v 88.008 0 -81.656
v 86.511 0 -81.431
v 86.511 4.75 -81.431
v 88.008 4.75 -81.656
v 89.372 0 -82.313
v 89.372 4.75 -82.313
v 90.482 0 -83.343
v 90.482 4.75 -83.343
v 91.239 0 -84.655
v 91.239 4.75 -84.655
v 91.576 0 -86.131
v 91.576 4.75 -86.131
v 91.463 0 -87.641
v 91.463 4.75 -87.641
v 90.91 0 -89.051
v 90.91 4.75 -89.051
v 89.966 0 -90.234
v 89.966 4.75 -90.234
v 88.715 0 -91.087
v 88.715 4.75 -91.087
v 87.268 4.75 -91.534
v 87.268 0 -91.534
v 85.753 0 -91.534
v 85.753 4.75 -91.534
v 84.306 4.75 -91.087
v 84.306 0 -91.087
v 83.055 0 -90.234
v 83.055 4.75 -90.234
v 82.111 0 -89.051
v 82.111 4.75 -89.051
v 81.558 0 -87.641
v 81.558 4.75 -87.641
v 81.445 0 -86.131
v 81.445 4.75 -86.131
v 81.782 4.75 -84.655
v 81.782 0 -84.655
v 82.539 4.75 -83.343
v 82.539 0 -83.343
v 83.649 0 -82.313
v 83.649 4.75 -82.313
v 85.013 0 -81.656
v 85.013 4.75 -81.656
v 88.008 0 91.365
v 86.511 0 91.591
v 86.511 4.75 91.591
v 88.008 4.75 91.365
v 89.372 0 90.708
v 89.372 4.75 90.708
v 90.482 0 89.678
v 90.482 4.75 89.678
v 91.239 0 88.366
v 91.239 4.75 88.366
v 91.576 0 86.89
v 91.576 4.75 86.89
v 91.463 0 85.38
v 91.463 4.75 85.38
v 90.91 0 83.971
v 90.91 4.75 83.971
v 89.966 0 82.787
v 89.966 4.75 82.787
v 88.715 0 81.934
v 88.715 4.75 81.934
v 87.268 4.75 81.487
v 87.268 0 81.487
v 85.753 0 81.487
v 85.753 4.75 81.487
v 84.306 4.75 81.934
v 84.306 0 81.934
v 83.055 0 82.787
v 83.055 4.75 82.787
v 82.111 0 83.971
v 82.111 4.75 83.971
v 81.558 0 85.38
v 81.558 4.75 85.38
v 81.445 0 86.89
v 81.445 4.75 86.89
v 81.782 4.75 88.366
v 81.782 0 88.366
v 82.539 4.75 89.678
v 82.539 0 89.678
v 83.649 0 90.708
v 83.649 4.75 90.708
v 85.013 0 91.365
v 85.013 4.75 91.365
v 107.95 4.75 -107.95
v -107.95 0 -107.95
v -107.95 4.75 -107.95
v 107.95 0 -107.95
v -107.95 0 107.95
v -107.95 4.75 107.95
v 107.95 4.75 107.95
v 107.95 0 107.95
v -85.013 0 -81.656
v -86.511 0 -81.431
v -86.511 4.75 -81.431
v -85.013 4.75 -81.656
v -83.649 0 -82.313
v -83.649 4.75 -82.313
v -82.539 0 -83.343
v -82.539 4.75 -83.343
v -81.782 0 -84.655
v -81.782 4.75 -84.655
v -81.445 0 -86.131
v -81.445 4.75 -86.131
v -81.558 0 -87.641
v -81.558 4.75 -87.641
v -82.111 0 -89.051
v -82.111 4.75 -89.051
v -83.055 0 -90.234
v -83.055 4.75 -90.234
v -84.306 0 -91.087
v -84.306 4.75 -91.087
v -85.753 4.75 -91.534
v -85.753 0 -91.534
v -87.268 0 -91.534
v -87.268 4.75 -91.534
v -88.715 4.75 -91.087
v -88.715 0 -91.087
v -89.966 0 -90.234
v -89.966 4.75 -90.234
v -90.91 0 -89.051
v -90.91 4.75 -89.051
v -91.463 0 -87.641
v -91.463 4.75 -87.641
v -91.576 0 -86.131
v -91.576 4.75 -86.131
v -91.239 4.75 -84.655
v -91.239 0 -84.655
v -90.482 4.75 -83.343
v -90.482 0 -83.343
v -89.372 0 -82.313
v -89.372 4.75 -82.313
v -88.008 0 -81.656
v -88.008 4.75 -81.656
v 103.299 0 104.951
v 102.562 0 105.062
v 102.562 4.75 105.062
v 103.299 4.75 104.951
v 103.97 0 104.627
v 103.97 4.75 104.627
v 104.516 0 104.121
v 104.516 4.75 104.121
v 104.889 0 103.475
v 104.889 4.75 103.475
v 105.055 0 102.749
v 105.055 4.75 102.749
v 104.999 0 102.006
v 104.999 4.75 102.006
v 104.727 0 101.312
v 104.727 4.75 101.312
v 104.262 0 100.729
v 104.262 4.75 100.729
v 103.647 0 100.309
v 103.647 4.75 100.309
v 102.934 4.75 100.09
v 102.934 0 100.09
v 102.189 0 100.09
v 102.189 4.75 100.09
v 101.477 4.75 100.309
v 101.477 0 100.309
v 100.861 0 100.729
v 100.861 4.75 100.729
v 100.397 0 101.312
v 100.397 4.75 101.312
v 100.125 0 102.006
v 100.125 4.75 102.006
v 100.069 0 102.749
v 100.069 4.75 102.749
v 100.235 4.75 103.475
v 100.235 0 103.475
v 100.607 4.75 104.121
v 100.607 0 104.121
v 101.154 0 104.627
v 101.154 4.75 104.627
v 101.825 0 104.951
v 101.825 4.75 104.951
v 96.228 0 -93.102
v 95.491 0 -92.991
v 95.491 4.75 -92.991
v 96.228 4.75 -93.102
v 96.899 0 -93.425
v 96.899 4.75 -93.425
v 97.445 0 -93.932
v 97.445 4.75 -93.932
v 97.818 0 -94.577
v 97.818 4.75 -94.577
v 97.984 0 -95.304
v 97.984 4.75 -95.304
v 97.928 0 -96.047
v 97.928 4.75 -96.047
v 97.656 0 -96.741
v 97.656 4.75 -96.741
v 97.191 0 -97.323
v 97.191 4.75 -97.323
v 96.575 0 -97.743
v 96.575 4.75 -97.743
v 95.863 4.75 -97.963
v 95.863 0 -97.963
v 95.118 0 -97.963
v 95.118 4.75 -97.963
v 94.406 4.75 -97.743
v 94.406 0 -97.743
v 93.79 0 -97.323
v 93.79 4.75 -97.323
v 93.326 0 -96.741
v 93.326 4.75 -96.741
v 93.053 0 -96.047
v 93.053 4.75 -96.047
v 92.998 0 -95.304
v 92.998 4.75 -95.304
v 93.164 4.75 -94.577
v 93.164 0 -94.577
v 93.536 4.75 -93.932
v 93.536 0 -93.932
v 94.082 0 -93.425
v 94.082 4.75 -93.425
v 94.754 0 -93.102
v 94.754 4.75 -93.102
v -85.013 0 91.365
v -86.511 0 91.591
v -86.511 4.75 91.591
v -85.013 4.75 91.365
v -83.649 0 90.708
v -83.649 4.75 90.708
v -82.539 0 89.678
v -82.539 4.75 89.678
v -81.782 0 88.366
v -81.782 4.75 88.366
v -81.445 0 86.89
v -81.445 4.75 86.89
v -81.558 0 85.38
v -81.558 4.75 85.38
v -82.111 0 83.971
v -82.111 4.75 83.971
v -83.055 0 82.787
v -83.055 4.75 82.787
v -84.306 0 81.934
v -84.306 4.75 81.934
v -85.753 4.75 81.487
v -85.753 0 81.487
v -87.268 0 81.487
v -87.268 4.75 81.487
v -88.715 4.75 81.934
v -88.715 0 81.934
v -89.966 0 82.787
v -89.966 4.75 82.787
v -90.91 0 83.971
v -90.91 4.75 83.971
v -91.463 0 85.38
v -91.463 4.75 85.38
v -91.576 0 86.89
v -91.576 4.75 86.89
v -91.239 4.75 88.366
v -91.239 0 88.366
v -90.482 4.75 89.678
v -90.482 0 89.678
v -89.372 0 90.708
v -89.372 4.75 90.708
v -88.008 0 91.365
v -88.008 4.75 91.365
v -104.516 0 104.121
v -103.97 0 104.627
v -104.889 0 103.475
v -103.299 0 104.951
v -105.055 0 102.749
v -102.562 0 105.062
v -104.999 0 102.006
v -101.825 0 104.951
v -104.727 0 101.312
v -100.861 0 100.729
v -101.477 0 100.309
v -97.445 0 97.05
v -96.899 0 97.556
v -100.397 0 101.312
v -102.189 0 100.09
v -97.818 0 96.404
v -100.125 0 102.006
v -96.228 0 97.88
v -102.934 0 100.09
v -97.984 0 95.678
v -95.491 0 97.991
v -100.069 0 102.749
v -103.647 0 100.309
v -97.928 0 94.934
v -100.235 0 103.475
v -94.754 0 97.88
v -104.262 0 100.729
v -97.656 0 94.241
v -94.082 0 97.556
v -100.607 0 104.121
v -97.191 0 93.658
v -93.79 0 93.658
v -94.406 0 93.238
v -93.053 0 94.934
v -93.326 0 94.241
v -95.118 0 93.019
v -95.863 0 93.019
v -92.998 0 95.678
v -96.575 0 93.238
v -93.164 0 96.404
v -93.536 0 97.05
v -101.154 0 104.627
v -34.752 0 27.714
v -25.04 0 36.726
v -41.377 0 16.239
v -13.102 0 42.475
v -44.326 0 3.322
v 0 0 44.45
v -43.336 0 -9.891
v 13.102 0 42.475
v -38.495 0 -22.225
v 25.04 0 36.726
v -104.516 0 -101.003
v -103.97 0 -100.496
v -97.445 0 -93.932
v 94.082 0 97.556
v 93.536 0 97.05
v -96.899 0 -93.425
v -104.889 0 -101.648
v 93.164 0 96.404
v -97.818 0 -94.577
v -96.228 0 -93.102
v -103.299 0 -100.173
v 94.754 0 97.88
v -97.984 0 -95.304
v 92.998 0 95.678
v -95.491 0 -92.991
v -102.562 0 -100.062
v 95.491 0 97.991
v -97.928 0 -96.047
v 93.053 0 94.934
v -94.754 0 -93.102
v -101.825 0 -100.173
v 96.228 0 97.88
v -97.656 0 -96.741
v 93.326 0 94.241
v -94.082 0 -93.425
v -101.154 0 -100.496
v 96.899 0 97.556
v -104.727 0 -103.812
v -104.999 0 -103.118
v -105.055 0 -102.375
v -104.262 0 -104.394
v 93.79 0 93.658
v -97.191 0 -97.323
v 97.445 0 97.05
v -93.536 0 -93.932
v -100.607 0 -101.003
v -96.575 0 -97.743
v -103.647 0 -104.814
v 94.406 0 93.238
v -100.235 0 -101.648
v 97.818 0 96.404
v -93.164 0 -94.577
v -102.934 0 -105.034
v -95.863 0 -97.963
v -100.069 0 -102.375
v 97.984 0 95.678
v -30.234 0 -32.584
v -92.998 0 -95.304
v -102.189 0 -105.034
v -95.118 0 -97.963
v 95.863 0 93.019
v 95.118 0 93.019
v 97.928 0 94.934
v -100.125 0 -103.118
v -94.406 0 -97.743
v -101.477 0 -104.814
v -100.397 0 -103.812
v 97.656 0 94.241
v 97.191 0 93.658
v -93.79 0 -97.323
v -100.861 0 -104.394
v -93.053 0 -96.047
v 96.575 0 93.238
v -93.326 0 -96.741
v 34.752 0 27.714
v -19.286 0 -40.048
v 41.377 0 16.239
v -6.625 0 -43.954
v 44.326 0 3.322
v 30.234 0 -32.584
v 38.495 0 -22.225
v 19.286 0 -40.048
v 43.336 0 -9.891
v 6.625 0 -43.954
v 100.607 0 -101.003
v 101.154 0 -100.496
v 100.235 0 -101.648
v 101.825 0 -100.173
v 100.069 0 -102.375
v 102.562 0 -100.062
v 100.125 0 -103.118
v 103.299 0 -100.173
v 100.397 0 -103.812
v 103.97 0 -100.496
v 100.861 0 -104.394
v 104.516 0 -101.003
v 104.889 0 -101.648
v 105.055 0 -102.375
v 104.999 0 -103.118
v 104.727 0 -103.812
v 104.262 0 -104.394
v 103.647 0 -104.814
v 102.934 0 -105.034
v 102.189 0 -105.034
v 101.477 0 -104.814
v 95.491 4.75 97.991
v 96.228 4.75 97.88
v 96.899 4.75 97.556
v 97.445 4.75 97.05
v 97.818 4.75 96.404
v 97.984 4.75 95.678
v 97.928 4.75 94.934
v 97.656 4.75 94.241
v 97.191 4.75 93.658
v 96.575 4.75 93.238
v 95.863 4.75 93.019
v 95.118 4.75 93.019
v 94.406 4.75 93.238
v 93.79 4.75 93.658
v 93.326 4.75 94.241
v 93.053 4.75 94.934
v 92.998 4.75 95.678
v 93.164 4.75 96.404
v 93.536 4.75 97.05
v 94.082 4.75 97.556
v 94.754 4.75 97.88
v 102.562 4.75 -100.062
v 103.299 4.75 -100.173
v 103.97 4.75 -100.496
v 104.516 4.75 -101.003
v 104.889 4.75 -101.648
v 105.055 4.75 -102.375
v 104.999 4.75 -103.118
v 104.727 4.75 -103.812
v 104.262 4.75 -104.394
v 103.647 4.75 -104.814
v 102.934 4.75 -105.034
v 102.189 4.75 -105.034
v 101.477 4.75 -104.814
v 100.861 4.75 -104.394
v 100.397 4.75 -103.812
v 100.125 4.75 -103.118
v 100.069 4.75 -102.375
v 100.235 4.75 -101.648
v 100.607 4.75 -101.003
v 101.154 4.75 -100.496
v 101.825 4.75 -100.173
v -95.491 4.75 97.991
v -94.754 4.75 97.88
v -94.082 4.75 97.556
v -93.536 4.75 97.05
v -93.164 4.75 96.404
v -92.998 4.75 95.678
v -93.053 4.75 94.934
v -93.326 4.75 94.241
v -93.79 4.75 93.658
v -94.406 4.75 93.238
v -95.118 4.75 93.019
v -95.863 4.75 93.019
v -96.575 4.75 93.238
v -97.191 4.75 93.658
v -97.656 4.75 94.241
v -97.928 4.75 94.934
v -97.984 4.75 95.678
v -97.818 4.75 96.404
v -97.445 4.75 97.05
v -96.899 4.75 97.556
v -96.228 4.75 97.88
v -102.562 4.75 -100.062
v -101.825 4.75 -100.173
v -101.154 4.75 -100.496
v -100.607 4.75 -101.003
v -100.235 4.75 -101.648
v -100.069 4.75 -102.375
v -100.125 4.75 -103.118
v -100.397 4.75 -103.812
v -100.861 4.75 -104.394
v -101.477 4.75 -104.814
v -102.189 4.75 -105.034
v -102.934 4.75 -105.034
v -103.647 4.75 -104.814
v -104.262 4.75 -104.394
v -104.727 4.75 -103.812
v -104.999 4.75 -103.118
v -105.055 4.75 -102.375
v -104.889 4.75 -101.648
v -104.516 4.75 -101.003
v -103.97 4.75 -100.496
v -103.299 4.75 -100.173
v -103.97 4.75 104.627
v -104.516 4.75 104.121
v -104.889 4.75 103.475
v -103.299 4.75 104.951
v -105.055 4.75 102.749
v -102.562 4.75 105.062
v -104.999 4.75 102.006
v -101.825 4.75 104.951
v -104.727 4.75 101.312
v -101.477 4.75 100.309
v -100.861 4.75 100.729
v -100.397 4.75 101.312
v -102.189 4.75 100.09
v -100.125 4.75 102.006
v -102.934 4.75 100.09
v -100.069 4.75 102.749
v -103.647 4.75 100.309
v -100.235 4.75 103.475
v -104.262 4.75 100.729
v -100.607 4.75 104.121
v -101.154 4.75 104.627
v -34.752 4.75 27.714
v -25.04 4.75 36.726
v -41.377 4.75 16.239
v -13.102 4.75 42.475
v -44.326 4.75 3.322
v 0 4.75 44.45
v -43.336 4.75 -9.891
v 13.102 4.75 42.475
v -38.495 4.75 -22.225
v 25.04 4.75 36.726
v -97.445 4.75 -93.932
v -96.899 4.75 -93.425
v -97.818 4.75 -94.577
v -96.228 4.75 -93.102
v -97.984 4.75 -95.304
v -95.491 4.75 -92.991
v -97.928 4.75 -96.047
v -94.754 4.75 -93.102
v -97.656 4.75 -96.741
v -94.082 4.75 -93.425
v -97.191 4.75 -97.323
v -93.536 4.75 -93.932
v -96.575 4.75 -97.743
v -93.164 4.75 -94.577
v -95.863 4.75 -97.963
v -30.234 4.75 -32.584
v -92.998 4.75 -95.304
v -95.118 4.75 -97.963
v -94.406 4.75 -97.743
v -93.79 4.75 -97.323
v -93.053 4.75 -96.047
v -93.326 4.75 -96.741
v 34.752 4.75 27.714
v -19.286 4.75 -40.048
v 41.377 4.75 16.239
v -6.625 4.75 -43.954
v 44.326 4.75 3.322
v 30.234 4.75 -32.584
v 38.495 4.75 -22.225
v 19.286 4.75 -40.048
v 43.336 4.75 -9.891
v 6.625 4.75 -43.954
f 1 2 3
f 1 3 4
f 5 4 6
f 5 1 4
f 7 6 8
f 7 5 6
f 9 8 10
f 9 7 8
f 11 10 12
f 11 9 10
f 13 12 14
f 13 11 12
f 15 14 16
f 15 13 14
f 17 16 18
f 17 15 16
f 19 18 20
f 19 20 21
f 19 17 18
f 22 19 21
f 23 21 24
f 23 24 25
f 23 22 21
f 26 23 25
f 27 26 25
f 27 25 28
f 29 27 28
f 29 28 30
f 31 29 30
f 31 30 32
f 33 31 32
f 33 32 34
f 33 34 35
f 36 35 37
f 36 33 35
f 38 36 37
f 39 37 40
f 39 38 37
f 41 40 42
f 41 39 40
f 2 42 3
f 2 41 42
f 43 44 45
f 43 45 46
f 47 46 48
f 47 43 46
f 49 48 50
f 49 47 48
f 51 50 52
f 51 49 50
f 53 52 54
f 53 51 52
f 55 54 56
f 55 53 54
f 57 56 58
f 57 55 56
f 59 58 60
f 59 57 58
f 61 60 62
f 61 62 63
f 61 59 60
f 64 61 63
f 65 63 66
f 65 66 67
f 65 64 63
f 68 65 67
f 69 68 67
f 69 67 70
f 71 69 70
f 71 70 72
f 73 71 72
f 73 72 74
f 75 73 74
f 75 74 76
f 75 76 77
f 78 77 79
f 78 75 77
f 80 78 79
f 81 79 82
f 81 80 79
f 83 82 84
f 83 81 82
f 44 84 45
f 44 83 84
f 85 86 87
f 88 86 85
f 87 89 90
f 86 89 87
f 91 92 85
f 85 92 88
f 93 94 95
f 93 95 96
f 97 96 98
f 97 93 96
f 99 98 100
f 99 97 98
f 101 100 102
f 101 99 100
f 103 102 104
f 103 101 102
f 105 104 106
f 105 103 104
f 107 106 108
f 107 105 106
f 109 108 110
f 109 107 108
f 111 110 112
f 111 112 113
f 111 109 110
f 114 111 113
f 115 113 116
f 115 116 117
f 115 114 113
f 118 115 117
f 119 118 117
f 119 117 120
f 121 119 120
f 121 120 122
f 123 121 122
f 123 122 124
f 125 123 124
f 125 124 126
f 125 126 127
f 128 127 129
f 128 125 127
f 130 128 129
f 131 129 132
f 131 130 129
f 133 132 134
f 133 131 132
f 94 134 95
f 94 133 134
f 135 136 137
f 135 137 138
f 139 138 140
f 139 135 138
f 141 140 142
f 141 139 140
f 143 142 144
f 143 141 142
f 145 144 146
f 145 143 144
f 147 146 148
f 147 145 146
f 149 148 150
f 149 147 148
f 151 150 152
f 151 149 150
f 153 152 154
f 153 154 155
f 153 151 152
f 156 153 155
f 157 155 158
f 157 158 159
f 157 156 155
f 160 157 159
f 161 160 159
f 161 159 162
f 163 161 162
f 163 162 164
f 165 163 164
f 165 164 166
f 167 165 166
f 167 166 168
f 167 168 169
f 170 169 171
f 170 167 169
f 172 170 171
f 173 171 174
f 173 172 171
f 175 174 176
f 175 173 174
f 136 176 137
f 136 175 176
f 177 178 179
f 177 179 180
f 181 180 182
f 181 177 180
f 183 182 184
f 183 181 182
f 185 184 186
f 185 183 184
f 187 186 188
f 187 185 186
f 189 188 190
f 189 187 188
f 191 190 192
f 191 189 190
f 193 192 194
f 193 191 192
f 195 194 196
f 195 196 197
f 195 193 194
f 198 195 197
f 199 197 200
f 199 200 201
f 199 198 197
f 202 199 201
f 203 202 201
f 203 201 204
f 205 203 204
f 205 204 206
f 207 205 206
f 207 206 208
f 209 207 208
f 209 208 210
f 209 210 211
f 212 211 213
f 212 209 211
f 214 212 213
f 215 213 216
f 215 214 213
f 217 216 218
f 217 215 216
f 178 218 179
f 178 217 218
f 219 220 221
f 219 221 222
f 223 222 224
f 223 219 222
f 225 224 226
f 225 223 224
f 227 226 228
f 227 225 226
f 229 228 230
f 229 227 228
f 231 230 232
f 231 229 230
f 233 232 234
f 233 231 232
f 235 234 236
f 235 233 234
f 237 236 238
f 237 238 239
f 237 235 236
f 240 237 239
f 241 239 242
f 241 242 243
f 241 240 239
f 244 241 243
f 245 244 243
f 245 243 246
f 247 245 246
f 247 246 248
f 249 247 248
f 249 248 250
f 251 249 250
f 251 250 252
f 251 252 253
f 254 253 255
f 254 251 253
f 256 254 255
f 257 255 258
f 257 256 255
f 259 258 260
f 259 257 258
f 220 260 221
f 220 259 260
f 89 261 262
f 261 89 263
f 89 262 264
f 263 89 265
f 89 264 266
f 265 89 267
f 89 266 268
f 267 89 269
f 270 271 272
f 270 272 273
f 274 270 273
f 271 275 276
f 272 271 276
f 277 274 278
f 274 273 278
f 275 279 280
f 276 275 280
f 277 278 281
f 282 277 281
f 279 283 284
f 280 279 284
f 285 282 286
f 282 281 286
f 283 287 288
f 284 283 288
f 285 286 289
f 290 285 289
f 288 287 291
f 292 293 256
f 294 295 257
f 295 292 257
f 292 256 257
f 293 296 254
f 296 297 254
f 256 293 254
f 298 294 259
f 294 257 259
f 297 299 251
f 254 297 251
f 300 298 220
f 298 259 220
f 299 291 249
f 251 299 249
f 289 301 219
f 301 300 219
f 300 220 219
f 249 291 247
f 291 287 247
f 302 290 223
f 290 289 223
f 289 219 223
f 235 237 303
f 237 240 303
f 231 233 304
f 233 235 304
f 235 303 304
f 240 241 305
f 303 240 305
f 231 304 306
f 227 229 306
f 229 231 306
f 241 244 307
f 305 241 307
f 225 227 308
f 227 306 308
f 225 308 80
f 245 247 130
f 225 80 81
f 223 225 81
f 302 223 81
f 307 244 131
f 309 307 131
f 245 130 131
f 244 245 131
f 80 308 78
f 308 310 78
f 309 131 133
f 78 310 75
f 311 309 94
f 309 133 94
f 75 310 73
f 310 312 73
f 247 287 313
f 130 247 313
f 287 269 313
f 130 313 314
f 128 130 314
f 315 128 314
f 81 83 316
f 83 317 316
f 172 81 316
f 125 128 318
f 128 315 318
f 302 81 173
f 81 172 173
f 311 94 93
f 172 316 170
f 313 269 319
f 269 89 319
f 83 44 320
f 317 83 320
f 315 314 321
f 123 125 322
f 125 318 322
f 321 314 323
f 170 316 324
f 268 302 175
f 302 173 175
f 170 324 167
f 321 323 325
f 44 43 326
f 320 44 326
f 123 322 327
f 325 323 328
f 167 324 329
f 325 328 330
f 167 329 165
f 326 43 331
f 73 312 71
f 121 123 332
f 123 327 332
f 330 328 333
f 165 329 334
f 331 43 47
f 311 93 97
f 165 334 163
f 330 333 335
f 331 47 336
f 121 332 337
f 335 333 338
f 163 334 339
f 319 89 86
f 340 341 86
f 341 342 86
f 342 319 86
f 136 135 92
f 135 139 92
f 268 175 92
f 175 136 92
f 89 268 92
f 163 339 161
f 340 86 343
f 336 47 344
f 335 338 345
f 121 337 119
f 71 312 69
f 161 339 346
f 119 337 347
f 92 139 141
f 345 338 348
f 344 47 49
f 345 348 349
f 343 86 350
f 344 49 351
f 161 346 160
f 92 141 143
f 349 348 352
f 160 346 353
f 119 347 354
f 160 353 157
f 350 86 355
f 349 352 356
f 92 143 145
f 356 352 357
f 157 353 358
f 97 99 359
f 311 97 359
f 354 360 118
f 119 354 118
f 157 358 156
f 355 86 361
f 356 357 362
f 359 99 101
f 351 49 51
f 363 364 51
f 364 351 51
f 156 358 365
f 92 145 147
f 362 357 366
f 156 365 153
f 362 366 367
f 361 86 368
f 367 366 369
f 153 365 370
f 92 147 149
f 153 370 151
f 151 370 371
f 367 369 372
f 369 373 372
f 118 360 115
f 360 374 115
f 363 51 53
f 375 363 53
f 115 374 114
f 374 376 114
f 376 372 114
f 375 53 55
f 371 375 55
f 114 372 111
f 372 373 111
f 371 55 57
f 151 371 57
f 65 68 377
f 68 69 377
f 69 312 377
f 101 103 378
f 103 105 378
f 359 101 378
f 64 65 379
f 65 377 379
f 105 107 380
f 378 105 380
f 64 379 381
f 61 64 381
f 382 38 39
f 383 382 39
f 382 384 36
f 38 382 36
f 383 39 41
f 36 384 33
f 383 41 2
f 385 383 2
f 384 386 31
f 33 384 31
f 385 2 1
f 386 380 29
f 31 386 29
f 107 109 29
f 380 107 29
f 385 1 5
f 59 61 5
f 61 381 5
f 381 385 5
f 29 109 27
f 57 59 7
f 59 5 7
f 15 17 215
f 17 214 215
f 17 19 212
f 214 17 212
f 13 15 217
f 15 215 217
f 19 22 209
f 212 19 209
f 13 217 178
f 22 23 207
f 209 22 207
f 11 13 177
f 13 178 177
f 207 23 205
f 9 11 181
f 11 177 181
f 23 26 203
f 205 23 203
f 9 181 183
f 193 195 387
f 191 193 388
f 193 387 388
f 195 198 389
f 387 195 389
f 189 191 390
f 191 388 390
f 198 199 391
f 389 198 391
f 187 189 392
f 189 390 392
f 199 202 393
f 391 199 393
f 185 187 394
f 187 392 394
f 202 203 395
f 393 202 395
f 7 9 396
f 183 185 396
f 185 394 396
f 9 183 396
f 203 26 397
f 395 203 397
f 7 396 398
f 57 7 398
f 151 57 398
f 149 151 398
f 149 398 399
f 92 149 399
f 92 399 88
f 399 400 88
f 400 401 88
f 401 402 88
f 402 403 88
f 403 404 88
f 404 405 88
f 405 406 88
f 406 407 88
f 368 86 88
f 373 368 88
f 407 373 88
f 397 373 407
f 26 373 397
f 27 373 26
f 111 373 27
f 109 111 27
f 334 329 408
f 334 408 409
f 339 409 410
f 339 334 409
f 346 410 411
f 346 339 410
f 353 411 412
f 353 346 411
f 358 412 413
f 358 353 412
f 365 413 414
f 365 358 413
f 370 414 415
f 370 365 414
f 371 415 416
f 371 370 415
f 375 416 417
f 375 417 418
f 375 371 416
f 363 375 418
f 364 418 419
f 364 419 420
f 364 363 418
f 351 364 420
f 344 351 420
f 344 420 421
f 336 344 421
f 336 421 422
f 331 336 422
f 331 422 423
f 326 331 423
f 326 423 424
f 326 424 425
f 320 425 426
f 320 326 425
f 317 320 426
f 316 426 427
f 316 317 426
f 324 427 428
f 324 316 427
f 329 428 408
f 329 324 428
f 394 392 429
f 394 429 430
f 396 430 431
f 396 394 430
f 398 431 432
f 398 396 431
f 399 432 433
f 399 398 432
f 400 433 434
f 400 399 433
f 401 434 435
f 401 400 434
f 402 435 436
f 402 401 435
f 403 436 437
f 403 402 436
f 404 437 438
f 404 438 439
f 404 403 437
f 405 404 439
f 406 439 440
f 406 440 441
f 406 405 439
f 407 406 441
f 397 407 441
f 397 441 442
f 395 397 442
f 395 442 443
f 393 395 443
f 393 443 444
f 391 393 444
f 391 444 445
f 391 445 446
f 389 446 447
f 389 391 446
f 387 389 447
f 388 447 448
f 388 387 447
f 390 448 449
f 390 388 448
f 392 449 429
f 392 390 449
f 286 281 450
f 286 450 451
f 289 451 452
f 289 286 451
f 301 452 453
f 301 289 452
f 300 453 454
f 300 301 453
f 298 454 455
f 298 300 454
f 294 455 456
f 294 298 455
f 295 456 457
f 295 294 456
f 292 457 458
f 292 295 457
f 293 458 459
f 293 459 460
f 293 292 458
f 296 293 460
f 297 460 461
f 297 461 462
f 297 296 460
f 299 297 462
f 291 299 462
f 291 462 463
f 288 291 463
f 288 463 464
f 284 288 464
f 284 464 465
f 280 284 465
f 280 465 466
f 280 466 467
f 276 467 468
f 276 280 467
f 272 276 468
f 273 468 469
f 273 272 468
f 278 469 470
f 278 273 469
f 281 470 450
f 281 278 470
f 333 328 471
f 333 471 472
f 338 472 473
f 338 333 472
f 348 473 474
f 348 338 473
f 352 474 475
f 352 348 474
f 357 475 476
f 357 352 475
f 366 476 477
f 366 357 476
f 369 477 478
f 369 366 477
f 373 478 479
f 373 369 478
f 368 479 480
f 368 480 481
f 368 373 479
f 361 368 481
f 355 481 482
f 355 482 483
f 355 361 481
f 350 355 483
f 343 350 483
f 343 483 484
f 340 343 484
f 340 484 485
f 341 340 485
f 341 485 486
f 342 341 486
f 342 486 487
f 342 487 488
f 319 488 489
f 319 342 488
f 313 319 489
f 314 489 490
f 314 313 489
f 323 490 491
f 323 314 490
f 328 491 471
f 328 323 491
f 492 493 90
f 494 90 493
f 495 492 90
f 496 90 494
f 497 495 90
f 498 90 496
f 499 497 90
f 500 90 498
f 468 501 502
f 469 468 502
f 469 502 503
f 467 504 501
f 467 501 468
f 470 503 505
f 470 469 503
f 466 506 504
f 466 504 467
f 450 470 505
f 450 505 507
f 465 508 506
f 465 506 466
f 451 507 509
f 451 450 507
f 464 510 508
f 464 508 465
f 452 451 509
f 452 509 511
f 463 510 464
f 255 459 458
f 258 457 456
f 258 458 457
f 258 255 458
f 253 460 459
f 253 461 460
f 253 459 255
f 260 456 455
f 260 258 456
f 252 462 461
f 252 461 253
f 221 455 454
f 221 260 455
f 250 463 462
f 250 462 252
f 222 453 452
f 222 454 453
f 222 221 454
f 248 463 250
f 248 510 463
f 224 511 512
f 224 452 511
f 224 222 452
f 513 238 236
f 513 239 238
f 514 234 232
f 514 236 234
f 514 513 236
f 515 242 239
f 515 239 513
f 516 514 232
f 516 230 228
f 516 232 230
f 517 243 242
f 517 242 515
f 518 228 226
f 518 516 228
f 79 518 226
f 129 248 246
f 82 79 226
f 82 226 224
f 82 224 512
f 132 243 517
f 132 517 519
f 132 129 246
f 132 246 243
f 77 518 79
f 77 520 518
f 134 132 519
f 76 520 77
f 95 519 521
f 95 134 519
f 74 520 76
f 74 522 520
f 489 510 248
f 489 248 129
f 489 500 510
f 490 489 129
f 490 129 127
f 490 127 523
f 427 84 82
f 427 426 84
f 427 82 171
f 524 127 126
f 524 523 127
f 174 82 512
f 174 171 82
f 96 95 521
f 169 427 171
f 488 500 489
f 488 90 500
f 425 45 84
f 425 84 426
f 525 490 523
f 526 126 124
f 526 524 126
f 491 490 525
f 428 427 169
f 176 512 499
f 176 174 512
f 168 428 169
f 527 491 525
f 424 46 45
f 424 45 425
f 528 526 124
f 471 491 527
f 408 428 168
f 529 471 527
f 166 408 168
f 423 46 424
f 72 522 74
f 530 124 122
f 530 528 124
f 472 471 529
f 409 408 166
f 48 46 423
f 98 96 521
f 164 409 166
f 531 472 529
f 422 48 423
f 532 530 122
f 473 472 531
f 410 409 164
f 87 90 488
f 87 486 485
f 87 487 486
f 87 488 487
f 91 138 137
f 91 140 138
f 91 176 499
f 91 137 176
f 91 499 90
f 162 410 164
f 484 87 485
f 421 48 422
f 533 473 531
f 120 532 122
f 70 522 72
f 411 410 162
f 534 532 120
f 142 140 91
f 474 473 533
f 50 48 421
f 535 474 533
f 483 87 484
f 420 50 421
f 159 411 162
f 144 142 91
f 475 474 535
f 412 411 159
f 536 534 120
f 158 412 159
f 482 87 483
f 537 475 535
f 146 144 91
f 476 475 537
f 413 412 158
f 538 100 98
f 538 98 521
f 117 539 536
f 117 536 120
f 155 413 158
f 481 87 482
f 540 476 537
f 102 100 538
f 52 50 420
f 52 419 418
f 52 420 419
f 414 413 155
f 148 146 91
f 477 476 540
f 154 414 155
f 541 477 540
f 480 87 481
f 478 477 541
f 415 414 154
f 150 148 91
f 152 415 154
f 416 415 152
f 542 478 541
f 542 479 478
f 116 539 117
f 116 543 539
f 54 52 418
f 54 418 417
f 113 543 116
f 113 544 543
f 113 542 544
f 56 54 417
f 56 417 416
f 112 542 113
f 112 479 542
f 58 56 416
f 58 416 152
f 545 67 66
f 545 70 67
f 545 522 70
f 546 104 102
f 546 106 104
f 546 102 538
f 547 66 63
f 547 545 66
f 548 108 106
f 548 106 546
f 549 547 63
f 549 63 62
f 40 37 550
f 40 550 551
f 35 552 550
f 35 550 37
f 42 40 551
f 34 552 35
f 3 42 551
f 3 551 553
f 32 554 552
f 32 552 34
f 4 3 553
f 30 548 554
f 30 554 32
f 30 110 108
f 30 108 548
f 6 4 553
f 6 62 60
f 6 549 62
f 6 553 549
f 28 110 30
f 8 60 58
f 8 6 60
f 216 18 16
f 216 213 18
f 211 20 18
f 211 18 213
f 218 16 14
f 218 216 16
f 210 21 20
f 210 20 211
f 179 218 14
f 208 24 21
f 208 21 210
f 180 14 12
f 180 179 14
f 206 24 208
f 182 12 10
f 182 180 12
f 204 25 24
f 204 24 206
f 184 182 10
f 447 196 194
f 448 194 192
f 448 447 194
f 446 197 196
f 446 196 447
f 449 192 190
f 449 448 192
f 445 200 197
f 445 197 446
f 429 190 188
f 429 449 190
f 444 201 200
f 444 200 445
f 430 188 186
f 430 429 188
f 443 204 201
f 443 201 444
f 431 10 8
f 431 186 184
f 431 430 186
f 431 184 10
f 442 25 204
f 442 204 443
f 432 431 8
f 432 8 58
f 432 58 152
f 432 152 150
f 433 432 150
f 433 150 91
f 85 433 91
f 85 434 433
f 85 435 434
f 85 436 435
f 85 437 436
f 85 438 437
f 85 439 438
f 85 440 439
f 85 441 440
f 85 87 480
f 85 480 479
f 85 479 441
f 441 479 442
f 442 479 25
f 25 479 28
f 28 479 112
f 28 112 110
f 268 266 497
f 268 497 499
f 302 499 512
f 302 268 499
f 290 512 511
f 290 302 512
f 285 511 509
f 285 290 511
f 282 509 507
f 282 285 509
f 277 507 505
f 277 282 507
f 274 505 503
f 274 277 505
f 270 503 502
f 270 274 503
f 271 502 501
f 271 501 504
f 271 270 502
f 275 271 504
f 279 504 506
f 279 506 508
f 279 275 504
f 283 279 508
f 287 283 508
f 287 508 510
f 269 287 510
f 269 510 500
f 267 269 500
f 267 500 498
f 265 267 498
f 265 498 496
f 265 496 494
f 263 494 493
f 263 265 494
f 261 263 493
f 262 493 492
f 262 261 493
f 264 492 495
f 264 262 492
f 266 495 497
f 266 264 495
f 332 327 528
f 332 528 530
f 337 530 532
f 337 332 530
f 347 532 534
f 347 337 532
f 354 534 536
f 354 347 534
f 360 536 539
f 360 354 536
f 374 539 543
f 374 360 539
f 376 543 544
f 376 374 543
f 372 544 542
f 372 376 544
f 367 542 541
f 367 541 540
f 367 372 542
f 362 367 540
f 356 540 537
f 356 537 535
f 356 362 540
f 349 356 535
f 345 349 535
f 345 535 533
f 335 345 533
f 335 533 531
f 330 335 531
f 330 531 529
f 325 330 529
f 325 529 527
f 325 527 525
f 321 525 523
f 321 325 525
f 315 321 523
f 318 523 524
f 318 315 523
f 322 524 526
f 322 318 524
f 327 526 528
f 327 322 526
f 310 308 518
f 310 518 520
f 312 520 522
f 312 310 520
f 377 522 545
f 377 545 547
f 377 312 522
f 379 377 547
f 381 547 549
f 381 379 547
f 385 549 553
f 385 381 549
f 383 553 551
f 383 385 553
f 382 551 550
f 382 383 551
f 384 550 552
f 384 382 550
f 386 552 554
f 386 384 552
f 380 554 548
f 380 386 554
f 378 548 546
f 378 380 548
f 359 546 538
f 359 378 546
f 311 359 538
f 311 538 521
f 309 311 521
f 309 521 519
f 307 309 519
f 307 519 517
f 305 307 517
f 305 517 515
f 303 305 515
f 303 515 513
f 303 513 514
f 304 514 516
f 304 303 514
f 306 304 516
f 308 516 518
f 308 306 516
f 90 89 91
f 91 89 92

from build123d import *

# Parameters (mm, degrees)
SKETCH1_W           = 215.9
SKETCH1_H           = 215.9
SKETCH1_R           = 2.5
SKETCH1_R_2         = 5.08
SKETCH1_R_3         = 44.45
BOSS_EXTRUDE1_DEPTH = 4.7498


with BuildPart() as part:
    # Sketch1 → Boss-Extrude1 (new body)
    with BuildSketch(Plane(origin=(0, 0, 0), x_dir=(1, 0, 0), z_dir=(0, 1, 0))):
        Rectangle(SKETCH1_W, SKETCH1_H)
        with Locations(Location((95.490778515, -95.490778515, 0), (0, 0, 270))):
            Circle(SKETCH1_R, mode=Mode.SUBTRACT)
        with Locations(Location((102.561846327, -102.561846327, 0), (0, 0, 270))):
            Circle(SKETCH1_R, mode=Mode.SUBTRACT)
        with Locations(Location((-95.490778515, -95.490778515, 0), (0, 0, 270))):
            Circle(SKETCH1_R, mode=Mode.SUBTRACT)
        with Locations(Location((-102.561846327, -102.561846327, 0), (0, 0, 270))):
            Circle(SKETCH1_R, mode=Mode.SUBTRACT)
        with Locations(Location((-95.490778515, 95.490778515, 0), (0, 0, 270))):
            Circle(SKETCH1_R, mode=Mode.SUBTRACT)
        with Locations(Location((-102.561846327, 102.561846327, 0), (0, 0, 270))):
            Circle(SKETCH1_R, mode=Mode.SUBTRACT)
        with Locations(Location((95.490778515, 95.490778515, 0), (0, 0, 270))):
            Circle(SKETCH1_R, mode=Mode.SUBTRACT)
        with Locations(Location((102.561846327, 102.561846327, 0), (0, 0, 270))):
            Circle(SKETCH1_R, mode=Mode.SUBTRACT)
        with Locations(Location((86.510522394, -86.510522394, 0), (0, 0, 270))):
            Circle(SKETCH1_R_2, mode=Mode.SUBTRACT)
        with Locations(Location((-86.510522394, -86.510522394, 0), (0, 0, 270))):
            Circle(SKETCH1_R_2, mode=Mode.SUBTRACT)
        with Locations(Location((-86.510522394, 86.510522394, 0), (0, 0, 270))):
            Circle(SKETCH1_R_2, mode=Mode.SUBTRACT)
        with Locations(Location((86.510522394, 86.510522394, 0), (0, 0, 270))):
            Circle(SKETCH1_R_2, mode=Mode.SUBTRACT)
        with Locations(Location((0, 0, 0), (0, 0, 270))):
            Circle(SKETCH1_R_3, mode=Mode.SUBTRACT)
    extrude(amount=BOSS_EXTRUDE1_DEPTH)


solid = part.part
